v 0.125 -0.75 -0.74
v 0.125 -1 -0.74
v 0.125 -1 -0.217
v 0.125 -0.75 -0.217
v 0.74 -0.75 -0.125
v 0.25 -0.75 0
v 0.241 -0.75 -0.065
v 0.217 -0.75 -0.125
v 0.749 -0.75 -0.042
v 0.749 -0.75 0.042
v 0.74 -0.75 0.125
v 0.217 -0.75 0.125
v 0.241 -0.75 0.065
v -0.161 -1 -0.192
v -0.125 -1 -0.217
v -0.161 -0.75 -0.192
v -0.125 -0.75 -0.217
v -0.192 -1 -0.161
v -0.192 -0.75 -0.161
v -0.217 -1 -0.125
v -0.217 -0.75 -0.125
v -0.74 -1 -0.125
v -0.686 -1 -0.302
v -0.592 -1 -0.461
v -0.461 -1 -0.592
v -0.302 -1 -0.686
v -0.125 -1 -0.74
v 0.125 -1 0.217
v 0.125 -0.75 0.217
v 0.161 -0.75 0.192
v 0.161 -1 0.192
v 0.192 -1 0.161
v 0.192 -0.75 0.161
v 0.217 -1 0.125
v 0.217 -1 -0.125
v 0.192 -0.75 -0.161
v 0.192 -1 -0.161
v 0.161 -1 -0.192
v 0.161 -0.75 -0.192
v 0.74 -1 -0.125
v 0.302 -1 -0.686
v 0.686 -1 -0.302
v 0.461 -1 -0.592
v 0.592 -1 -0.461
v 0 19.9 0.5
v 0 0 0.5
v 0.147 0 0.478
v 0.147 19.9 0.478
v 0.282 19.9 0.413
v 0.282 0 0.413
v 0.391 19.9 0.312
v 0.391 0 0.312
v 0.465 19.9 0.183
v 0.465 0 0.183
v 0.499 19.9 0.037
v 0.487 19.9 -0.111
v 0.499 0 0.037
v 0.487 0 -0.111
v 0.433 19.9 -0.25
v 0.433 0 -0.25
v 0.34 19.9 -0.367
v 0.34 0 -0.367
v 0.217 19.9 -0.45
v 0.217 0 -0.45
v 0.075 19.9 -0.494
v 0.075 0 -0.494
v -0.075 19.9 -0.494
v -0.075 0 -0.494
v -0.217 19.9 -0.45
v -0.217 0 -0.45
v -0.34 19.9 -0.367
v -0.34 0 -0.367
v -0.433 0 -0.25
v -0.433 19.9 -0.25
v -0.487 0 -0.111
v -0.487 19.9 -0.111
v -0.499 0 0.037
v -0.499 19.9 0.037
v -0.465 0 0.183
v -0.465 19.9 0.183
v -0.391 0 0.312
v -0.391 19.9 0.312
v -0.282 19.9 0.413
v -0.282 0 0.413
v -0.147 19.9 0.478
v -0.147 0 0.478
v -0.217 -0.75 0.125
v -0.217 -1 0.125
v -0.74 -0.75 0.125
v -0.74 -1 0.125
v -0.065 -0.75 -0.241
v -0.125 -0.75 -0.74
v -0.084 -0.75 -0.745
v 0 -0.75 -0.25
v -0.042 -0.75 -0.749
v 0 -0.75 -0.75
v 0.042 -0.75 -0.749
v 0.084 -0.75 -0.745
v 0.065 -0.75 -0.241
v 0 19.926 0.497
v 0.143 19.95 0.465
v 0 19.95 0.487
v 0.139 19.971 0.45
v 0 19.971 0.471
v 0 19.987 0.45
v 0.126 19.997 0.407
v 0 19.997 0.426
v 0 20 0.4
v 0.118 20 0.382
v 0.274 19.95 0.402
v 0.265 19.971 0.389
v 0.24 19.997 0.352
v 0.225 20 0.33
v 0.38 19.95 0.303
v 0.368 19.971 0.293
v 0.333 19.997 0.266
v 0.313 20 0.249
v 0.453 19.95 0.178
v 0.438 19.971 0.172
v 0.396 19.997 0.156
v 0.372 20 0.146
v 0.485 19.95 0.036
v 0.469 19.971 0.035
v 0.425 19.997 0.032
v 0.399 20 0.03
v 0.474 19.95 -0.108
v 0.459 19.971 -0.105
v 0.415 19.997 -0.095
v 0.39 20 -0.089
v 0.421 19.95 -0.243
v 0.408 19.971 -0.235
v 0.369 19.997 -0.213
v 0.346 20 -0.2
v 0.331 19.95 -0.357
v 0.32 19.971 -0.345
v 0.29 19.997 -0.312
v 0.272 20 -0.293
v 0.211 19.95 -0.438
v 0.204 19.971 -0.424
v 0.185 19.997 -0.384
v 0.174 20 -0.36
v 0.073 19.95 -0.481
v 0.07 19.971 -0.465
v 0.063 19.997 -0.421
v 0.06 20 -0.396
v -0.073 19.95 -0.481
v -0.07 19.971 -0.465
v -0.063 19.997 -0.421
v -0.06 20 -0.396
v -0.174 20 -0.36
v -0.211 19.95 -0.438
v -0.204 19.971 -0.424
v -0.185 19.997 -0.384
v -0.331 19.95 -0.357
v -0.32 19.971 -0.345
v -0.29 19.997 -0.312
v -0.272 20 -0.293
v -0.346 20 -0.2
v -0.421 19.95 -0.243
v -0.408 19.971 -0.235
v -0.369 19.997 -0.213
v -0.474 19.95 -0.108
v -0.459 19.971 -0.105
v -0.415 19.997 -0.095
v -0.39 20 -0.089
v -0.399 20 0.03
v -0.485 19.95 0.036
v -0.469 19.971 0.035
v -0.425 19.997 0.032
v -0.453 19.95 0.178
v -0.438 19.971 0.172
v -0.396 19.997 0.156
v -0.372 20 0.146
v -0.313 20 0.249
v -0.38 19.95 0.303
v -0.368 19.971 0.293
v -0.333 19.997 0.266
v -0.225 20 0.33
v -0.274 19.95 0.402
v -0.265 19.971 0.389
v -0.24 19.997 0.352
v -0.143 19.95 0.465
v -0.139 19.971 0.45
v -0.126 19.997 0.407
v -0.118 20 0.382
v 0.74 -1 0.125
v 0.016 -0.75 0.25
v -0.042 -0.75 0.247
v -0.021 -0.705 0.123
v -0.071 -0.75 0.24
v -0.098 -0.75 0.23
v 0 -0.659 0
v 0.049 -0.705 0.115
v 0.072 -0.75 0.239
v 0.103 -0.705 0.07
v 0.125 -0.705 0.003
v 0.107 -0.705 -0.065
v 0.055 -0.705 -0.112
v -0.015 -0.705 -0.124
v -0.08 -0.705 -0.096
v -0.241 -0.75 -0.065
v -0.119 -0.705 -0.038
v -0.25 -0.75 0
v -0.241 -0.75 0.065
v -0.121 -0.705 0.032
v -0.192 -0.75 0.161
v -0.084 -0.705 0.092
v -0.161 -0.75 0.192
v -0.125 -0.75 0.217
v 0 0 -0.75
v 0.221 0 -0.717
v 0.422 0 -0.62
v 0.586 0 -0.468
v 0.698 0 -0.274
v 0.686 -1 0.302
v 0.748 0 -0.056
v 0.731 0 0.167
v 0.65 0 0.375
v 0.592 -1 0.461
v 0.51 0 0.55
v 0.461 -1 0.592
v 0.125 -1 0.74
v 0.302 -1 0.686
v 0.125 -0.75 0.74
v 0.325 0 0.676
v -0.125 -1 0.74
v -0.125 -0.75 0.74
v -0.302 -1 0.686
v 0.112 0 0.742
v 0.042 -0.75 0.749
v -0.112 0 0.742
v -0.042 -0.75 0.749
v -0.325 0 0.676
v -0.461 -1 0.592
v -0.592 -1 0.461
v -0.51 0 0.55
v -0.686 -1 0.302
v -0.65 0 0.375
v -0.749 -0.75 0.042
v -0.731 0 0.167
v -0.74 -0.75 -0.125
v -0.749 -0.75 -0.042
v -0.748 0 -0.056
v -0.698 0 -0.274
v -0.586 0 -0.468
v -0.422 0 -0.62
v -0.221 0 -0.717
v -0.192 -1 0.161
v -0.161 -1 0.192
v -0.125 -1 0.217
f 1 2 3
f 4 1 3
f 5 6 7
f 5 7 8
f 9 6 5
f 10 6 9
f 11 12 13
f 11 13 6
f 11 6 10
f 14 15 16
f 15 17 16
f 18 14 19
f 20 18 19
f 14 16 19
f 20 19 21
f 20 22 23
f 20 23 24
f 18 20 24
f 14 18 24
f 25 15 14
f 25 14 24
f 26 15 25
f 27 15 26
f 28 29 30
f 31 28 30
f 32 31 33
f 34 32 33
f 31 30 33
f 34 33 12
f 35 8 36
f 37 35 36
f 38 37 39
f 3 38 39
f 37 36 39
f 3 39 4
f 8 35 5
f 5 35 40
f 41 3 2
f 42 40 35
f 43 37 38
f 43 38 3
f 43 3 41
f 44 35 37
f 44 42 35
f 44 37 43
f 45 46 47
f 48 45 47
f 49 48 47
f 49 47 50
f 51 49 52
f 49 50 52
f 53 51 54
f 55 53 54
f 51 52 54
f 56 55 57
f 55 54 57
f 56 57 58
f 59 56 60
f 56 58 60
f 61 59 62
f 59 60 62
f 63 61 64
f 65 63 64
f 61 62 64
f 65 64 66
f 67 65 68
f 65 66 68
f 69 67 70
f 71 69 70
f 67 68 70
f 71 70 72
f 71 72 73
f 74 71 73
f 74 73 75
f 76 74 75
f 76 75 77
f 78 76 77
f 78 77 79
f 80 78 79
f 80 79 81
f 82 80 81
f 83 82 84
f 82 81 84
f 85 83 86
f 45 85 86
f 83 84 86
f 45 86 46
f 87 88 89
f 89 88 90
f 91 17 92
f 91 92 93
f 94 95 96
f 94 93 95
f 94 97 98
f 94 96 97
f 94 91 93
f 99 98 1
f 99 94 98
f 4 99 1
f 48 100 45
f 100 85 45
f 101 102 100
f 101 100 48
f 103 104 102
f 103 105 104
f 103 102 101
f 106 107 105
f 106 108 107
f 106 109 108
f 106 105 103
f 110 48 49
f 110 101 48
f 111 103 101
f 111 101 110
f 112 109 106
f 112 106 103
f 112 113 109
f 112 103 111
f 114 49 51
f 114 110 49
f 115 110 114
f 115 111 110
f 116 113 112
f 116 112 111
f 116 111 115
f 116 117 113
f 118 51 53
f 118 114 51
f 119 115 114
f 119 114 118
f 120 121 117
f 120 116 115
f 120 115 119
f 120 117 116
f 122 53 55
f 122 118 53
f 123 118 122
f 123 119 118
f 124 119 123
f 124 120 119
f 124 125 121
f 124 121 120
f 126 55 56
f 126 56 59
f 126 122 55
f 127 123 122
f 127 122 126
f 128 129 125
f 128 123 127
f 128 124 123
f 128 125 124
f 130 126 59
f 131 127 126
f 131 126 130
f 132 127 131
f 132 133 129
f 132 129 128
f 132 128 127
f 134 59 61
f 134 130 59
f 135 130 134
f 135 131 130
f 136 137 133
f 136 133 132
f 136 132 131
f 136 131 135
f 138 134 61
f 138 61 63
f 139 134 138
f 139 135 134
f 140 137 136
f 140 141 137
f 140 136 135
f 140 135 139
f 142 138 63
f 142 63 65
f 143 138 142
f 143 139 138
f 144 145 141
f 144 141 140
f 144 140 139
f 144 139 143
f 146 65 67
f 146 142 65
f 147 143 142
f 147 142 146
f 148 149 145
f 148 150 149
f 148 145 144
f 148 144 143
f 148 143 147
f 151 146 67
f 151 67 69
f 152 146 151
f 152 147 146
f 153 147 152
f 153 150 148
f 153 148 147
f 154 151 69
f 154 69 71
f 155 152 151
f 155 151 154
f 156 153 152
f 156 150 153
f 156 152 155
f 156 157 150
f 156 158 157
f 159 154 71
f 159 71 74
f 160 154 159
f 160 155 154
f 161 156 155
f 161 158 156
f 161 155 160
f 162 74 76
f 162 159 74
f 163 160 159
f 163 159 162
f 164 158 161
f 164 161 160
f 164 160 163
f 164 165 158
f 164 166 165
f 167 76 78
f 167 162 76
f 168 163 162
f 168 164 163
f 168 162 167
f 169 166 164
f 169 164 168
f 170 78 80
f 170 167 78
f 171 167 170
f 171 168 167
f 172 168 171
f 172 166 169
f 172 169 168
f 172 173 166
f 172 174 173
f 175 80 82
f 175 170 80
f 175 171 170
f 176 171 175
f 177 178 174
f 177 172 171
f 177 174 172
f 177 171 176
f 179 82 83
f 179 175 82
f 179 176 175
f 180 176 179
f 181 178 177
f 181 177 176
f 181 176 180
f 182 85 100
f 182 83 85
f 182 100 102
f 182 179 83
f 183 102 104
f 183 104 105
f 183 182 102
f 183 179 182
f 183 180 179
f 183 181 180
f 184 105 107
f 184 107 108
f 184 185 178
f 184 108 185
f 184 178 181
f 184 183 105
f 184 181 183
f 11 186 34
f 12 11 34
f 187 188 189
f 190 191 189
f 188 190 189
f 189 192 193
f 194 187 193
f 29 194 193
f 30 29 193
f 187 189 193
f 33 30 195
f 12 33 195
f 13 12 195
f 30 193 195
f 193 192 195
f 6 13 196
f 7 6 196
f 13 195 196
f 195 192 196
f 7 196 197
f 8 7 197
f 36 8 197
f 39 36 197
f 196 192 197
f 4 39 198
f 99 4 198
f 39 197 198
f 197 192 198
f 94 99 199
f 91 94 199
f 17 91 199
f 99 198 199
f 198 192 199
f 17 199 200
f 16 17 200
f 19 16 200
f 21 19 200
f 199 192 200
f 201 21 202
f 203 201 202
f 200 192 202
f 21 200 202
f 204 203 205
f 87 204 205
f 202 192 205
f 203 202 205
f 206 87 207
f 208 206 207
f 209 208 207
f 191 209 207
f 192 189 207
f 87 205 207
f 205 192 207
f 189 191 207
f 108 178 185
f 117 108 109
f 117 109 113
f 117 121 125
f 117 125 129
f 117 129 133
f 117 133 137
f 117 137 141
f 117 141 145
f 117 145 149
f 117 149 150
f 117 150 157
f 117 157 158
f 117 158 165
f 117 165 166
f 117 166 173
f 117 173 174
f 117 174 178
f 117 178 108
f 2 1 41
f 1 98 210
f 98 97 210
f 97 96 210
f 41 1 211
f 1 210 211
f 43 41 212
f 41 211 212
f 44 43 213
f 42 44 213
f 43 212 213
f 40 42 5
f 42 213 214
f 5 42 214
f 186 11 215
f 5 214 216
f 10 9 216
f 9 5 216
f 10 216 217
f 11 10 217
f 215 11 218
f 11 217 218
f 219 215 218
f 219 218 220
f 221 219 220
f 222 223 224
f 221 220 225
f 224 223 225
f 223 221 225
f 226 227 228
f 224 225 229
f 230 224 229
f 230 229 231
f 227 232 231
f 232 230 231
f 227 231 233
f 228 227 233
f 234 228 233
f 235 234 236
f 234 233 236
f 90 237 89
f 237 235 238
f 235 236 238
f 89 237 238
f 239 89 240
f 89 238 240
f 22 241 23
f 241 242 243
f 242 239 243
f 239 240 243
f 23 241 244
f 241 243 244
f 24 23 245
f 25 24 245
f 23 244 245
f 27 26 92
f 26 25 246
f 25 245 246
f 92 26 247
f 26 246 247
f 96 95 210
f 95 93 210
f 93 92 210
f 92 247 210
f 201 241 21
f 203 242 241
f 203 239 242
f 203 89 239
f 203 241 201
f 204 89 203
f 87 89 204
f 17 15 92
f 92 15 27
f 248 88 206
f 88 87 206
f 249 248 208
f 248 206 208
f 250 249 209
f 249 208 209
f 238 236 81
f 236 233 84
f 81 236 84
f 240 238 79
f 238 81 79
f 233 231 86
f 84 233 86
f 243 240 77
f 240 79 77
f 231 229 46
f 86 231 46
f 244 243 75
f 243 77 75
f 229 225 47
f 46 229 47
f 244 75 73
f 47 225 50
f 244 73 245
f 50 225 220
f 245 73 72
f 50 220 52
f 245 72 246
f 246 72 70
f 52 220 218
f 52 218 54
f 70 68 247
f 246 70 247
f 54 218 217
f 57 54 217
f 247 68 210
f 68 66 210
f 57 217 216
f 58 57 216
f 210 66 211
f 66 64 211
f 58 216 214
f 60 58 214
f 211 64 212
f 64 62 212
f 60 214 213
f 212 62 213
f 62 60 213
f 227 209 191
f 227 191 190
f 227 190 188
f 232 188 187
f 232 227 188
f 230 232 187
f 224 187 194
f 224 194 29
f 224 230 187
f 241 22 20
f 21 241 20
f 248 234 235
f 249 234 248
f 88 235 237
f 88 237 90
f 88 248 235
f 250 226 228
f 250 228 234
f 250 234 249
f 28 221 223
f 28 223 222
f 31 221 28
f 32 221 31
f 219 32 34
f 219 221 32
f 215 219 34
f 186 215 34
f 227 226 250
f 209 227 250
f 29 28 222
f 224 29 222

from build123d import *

# Parameters (mm, degrees)
SKETCH1_R           = 0.5
BOSS_EXTRUDE1_DEPTH = 20
SKETCH2_R           = 0.75
BOSS_EXTRUDE2_DEPTH = 1
CUT_EXTRUDE1_DEPTH  = 0.25
FILLET1_R           = 0.1


with BuildPart() as part:
    # Sketch1 → Boss-Extrude1 (new body)
    with BuildSketch(Plane(origin=(0, 0, 0), x_dir=(1, 0, 0), z_dir=(0, 1, 0))):
        with Locations(Location((0, 0, 0), (0, 0, 270))):
            Circle(SKETCH1_R)
    extrude(amount=BOSS_EXTRUDE1_DEPTH)

    # Sketch2 → Boss-Extrude2 (add)
    with BuildSketch(Plane.XZ):
        with Locations(Location((0, 0, 0), (0, 0, 270))):
            Circle(SKETCH2_R)
    extrude(amount=BOSS_EXTRUDE2_DEPTH)

    # Sketch3 → Cut-Extrude1 (cut)
    with BuildSketch(Plane.XZ.offset(1)):
        Polygon((-0.125, 0.125), (-0.875467833, 0.125), (-0.875467833, -0.125), (-0.125, -0.125), (-0.125, -0.835149175), (0.125, -0.835149175), (0.125, -0.125), (0.875467833, -0.125), (0.875467833, 0.125), (0.125, 0.125), (0.125, 0.835149175), (-0.125, 0.835149175), align=None)
    extrude(amount=-CUT_EXTRUDE1_DEPTH, mode=Mode.SUBTRACT)

    # Sketch5 → Cut-Revolve1 (revolve, cut)
    with BuildSketch(Plane(origin=(0, 0, 0), x_dir=(0, 0, -1), z_dir=(1, 0, 0)), mode=Mode.PRIVATE) as cut_revolve1_sk:
        Polygon((0, -0.659007441), (0, -1), (0.25, -1), (0.25, -0.75), align=None)
    revolve(cut_revolve1_sk.sketch.rotate(Axis((0, -0.659007441, 0), (0, 1, 0)), 170.405931773), axis=Axis((0, -0.659007441, 0), (0, 1, 0)), mode=Mode.SUBTRACT)

    # Fillet1
    fillet1_edges = [part.edges().sort_by_distance(p)[0] for p in [
        (0, 20, -0.5),
    ]]
    fillet(fillet1_edges, radius=FILLET1_R)


solid = part.part
